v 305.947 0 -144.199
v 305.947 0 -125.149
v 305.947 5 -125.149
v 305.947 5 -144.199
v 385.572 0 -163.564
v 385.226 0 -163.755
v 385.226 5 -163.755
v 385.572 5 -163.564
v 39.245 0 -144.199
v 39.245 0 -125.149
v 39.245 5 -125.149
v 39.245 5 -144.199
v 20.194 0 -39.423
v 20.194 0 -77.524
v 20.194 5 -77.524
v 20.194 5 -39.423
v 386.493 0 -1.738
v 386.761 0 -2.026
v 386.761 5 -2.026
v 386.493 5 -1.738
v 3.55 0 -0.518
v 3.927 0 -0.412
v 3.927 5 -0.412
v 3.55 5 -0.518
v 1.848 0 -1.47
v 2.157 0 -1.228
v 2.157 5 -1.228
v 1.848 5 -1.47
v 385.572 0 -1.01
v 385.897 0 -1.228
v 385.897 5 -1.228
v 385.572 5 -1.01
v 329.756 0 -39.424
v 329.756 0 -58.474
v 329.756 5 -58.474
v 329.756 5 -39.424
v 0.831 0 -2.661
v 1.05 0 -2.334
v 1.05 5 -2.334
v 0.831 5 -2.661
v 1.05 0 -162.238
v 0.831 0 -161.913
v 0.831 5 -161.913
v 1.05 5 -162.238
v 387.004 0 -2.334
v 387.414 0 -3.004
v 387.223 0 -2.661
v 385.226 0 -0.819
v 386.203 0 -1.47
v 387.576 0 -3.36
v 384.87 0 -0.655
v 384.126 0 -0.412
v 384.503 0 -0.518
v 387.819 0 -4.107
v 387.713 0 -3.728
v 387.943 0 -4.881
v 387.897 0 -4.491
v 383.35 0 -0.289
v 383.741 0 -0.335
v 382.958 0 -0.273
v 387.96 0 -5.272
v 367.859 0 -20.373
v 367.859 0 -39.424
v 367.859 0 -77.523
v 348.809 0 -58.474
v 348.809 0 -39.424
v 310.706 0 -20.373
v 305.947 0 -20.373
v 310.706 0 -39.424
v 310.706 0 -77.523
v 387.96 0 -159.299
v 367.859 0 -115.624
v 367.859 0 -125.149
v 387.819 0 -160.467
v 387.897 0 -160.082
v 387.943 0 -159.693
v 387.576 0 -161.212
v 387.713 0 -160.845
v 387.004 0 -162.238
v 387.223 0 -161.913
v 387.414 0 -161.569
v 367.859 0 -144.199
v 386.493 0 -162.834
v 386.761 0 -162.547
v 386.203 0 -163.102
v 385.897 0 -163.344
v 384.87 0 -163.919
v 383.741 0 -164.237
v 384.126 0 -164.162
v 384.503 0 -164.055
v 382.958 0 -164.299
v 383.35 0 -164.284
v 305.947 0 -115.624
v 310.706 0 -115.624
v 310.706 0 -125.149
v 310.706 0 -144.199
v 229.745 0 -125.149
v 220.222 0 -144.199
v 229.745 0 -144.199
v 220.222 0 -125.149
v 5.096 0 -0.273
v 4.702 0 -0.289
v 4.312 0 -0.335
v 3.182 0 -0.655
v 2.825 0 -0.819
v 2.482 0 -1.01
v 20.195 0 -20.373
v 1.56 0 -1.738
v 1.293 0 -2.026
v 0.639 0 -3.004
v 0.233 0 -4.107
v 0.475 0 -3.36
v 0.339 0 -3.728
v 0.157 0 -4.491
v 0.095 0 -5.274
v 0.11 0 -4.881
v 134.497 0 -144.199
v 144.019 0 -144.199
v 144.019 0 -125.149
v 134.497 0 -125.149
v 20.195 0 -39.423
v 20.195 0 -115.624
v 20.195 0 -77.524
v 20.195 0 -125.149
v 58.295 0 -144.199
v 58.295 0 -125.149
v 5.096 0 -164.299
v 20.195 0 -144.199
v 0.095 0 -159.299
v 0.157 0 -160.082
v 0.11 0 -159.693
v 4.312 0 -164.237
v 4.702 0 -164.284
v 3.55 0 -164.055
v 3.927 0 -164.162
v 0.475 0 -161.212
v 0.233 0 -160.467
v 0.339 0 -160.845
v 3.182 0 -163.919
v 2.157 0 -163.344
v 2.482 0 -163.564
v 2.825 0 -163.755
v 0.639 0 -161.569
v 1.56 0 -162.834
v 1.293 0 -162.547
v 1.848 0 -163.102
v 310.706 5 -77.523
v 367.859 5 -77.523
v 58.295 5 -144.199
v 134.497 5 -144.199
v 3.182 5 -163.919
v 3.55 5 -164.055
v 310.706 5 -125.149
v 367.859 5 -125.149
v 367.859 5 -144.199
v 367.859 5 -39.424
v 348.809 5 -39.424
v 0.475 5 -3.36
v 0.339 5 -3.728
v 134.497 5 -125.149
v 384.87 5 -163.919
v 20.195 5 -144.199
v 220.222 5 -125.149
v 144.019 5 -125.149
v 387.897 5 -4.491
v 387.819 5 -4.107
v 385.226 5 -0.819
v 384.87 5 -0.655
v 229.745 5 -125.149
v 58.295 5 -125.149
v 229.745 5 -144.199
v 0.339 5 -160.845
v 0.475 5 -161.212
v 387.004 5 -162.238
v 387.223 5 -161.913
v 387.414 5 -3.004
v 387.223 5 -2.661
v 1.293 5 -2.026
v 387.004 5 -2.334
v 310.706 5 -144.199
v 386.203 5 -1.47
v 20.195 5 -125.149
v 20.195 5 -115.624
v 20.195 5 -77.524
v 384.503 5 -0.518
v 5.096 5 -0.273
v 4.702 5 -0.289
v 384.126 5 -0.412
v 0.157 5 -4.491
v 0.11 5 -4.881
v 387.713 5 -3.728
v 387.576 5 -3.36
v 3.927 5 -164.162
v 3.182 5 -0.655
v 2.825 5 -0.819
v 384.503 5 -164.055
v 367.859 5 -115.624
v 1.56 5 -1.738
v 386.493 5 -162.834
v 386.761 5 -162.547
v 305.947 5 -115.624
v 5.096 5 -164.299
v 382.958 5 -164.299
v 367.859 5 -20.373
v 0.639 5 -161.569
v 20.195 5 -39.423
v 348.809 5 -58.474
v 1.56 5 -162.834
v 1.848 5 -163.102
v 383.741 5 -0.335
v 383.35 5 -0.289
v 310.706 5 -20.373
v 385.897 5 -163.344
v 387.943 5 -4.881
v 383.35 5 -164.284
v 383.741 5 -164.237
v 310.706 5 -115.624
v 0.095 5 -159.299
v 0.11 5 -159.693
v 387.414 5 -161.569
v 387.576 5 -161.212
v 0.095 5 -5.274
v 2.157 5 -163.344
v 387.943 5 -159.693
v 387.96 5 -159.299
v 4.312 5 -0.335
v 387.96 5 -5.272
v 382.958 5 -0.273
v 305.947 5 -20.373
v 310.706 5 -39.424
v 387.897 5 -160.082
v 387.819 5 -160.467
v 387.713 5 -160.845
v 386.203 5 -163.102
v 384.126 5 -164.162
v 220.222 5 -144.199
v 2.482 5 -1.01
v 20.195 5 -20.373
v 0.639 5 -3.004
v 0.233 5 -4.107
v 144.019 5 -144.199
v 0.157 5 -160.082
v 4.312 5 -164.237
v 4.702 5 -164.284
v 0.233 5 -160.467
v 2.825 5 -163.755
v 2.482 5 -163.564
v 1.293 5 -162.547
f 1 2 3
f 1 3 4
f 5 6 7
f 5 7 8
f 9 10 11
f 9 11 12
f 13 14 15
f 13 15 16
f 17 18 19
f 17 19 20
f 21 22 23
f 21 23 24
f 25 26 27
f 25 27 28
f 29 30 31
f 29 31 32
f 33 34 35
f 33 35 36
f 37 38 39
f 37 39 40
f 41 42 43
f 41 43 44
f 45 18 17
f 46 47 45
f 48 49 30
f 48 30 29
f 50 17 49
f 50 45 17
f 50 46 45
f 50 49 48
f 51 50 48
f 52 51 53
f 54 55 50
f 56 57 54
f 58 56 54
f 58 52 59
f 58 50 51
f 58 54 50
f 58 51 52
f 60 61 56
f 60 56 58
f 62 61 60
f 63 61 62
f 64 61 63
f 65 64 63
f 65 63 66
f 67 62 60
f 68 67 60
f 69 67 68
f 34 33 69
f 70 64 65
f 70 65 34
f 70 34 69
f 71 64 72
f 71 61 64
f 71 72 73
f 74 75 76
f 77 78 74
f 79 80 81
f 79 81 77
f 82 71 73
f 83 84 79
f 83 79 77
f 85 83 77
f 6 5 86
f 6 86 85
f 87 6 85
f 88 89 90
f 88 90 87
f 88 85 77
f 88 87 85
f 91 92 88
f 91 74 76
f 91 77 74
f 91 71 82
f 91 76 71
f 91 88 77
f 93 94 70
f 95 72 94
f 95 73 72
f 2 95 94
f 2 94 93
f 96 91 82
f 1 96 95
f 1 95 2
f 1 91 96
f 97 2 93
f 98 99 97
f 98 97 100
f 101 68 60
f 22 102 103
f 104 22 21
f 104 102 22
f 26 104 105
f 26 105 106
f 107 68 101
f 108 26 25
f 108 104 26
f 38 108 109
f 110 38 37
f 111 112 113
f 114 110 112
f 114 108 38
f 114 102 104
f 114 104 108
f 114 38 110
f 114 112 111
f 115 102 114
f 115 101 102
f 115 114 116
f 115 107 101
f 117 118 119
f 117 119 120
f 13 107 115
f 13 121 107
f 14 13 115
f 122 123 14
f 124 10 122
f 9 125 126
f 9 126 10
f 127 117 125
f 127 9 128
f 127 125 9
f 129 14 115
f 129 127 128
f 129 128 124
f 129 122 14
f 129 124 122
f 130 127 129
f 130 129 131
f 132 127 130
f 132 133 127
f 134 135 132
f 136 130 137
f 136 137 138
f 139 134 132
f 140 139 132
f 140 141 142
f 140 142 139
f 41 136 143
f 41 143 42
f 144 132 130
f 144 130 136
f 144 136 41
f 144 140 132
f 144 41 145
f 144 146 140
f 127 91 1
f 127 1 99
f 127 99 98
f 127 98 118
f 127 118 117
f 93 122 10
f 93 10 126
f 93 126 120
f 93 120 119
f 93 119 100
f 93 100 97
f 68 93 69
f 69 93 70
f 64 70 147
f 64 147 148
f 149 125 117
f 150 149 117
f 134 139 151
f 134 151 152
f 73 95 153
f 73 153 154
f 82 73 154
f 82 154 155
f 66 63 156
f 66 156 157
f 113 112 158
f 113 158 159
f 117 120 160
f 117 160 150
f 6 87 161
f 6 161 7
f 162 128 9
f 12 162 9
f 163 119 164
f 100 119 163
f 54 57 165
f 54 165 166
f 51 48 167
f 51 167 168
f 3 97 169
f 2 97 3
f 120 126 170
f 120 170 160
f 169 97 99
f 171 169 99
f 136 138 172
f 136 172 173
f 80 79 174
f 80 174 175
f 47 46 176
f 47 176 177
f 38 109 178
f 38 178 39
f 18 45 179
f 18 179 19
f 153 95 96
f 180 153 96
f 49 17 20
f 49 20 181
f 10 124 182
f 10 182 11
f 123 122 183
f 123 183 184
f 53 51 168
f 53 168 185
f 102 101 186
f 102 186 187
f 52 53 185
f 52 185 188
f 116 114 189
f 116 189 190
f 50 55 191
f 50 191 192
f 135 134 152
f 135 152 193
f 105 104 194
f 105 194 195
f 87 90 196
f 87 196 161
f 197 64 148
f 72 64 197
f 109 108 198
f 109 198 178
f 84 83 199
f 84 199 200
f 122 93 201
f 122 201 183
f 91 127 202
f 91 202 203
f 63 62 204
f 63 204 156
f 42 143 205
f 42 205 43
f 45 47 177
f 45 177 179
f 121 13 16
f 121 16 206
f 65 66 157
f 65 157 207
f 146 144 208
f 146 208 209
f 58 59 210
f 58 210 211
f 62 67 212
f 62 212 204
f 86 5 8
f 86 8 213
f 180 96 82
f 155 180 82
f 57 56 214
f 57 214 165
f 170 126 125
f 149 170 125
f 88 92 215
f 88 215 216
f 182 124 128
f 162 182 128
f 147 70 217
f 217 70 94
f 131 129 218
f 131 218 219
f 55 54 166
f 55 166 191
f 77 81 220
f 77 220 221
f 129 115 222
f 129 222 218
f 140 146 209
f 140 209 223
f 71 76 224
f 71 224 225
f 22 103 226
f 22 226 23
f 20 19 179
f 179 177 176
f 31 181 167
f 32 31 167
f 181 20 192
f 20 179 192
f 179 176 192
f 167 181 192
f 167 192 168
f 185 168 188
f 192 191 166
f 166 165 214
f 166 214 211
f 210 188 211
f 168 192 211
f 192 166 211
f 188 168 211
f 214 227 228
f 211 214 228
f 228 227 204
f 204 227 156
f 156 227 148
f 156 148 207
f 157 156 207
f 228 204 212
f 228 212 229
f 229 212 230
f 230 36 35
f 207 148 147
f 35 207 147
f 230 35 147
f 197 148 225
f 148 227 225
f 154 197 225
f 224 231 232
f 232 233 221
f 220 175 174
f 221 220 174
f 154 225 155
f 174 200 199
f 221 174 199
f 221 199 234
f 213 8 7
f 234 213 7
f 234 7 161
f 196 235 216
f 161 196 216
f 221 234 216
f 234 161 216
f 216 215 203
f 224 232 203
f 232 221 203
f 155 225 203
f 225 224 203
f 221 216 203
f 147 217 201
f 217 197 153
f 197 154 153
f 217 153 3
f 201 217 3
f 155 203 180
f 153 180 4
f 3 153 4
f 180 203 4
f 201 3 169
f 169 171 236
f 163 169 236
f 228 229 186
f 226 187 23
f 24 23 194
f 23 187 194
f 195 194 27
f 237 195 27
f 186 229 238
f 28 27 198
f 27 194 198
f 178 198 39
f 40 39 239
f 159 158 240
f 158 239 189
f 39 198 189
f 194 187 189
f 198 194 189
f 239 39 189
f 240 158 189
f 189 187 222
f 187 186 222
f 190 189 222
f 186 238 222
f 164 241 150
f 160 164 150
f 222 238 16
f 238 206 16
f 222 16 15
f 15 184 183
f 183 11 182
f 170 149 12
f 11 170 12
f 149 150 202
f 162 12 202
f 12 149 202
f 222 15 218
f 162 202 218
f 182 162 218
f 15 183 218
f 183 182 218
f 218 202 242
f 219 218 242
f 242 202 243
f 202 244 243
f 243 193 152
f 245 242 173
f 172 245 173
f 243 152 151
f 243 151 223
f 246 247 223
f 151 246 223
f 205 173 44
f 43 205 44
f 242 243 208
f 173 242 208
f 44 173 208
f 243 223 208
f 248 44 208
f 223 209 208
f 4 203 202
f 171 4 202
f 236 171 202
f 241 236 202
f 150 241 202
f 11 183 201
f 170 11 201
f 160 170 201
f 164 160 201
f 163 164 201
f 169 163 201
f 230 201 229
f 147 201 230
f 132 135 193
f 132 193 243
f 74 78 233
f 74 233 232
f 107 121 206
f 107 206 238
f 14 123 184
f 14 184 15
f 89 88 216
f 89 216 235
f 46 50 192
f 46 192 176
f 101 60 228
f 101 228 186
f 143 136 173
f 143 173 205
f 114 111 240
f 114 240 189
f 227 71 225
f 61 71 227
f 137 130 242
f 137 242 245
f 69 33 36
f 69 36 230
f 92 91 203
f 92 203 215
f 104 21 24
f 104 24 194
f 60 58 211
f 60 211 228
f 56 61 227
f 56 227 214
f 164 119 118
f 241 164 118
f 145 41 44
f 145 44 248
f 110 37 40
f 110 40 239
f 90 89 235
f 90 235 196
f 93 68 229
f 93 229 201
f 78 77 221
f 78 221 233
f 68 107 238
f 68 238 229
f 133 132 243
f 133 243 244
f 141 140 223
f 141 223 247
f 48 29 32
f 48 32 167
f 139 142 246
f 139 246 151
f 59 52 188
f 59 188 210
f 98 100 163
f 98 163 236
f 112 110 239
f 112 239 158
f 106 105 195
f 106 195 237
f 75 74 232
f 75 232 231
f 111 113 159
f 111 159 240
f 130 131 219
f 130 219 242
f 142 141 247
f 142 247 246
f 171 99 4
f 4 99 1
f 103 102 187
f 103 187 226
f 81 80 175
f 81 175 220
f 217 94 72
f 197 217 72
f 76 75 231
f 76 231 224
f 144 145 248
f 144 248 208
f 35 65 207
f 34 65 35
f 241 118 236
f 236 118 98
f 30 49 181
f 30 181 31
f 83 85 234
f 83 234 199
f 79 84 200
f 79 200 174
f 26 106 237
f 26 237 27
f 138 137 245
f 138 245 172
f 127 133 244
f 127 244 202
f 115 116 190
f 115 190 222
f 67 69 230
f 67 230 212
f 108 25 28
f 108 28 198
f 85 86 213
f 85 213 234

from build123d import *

# Parameters (mm, degrees)
SKETCH2_W           = 57.153
SKETCH2_H           = 38.1011
SKETCH2_H_2         = 19.05
SKETCH2_W_2         = 76.202
SKETCH2_W_3         = 76.203
SKETCH2_W_4         = 76.2019
SKETCH2_W_5         = 19.0499
BOSS_EXTRUDE1_DEPTH = 5


with BuildPart() as part:
    # Sketch2 → Boss-Extrude1 (new body)
    with BuildSketch(Plane(origin=(0, 0, 0), x_dir=(1, 0, 0), z_dir=(0, 1, 0))):
        Polygon((382.958, 164.299), (383.35, 164.284), (383.741, 164.237), (384.126, 164.162), (384.503, 164.055), (384.87, 163.919), (385.226, 163.755), (385.572, 163.564), (385.897, 163.344), (386.203, 163.102), (386.493, 162.834), (386.761, 162.547), (387.004, 162.238), (387.223, 161.913), (387.414, 161.569), (387.576, 161.212), (387.713, 160.845), (387.819, 160.467), (387.897, 160.082), (387.943, 159.693), (387.96, 159.299), (387.96, 5.27237), (387.943, 4.881), (387.897, 4.49104), (387.819, 4.10655), (387.713, 3.72759), (387.576, 3.35966), (387.414, 3.00412), (387.223, 2.66099), (387.004, 2.3344), (386.761, 2.02572), (386.493, 1.73771), (386.203, 1.47037), (385.897, 1.22783), (385.572, 1.0101), (385.226, 0.818554), (384.87, 0.654569), (384.503, 0.518142), (384.126, 0.412034), (383.741, 0.334863), (383.35, 0.289388), (382.958, 0.272852), (5.09598, 0.272852), (4.70186, 0.289388), (4.3119, 0.334863), (3.9274, 0.412034), (3.54983, 0.518142), (3.18189, 0.654569), (2.82498, 0.818554), (2.48185, 1.0101), (2.15663, 1.22783), (1.84795, 1.47037), (1.55994, 1.73771), (1.2926, 2.02572), (1.05006, 2.3344), (0.830957, 2.66099), (0.63941, 3.00412), (0.475424, 3.35966), (0.338998, 3.72759), (0.232888, 4.10655), (0.157097, 4.49104), (0.110243, 4.881), (0.0950846, 5.27375), (0.0950846, 159.299), (0.110243, 159.693), (0.157097, 160.082), (0.232888, 160.467), (0.338998, 160.845), (0.475424, 161.212), (0.63941, 161.569), (0.830957, 161.913), (1.05006, 162.238), (1.2926, 162.547), (1.55994, 162.834), (1.84795, 163.102), (2.15663, 163.344), (2.48185, 163.564), (2.82498, 163.755), (3.18189, 163.919), (3.54983, 164.055), (3.9274, 164.162), (4.3119, 164.237), (4.70186, 164.284), (5.09598, 164.299), align=None)
        Polygon((329.756, 58.4743), (329.756, 39.4243), (310.706, 39.4243), (310.706, 20.3729), (367.859, 20.3729), (367.859, 39.4243), (348.809, 39.4243), (348.809, 58.4743), align=None, mode=Mode.SUBTRACT)
        Polygon((20.1952, 115.624), (20.1952, 77.5243), (20.1938, 77.5243), (20.1938, 39.4229), (20.1952, 39.4229), (20.1952, 20.3729), (305.947, 20.3729), (305.947, 115.624), align=None, mode=Mode.SUBTRACT)
        with Locations((339.2825, 96.57345)):
            Rectangle(SKETCH2_W, SKETCH2_H, mode=Mode.SUBTRACT)
        with Locations((339.2825, 134.674)):
            Rectangle(SKETCH2_W, SKETCH2_H_2, mode=Mode.SUBTRACT)
        with Locations((267.846, 134.674)):
            Rectangle(SKETCH2_W_2, SKETCH2_H_2, mode=Mode.SUBTRACT)
        with Locations((182.1205, 134.674)):
            Rectangle(SKETCH2_W_3, SKETCH2_H_2, mode=Mode.SUBTRACT)
        with Locations((96.39605, 134.674)):
            Rectangle(SKETCH2_W_4, SKETCH2_H_2, mode=Mode.SUBTRACT)
        with Locations((29.72015, 134.674)):
            Rectangle(SKETCH2_W_5, SKETCH2_H_2, mode=Mode.SUBTRACT)
    extrude(amount=BOSS_EXTRUDE1_DEPTH)


solid = part.part
